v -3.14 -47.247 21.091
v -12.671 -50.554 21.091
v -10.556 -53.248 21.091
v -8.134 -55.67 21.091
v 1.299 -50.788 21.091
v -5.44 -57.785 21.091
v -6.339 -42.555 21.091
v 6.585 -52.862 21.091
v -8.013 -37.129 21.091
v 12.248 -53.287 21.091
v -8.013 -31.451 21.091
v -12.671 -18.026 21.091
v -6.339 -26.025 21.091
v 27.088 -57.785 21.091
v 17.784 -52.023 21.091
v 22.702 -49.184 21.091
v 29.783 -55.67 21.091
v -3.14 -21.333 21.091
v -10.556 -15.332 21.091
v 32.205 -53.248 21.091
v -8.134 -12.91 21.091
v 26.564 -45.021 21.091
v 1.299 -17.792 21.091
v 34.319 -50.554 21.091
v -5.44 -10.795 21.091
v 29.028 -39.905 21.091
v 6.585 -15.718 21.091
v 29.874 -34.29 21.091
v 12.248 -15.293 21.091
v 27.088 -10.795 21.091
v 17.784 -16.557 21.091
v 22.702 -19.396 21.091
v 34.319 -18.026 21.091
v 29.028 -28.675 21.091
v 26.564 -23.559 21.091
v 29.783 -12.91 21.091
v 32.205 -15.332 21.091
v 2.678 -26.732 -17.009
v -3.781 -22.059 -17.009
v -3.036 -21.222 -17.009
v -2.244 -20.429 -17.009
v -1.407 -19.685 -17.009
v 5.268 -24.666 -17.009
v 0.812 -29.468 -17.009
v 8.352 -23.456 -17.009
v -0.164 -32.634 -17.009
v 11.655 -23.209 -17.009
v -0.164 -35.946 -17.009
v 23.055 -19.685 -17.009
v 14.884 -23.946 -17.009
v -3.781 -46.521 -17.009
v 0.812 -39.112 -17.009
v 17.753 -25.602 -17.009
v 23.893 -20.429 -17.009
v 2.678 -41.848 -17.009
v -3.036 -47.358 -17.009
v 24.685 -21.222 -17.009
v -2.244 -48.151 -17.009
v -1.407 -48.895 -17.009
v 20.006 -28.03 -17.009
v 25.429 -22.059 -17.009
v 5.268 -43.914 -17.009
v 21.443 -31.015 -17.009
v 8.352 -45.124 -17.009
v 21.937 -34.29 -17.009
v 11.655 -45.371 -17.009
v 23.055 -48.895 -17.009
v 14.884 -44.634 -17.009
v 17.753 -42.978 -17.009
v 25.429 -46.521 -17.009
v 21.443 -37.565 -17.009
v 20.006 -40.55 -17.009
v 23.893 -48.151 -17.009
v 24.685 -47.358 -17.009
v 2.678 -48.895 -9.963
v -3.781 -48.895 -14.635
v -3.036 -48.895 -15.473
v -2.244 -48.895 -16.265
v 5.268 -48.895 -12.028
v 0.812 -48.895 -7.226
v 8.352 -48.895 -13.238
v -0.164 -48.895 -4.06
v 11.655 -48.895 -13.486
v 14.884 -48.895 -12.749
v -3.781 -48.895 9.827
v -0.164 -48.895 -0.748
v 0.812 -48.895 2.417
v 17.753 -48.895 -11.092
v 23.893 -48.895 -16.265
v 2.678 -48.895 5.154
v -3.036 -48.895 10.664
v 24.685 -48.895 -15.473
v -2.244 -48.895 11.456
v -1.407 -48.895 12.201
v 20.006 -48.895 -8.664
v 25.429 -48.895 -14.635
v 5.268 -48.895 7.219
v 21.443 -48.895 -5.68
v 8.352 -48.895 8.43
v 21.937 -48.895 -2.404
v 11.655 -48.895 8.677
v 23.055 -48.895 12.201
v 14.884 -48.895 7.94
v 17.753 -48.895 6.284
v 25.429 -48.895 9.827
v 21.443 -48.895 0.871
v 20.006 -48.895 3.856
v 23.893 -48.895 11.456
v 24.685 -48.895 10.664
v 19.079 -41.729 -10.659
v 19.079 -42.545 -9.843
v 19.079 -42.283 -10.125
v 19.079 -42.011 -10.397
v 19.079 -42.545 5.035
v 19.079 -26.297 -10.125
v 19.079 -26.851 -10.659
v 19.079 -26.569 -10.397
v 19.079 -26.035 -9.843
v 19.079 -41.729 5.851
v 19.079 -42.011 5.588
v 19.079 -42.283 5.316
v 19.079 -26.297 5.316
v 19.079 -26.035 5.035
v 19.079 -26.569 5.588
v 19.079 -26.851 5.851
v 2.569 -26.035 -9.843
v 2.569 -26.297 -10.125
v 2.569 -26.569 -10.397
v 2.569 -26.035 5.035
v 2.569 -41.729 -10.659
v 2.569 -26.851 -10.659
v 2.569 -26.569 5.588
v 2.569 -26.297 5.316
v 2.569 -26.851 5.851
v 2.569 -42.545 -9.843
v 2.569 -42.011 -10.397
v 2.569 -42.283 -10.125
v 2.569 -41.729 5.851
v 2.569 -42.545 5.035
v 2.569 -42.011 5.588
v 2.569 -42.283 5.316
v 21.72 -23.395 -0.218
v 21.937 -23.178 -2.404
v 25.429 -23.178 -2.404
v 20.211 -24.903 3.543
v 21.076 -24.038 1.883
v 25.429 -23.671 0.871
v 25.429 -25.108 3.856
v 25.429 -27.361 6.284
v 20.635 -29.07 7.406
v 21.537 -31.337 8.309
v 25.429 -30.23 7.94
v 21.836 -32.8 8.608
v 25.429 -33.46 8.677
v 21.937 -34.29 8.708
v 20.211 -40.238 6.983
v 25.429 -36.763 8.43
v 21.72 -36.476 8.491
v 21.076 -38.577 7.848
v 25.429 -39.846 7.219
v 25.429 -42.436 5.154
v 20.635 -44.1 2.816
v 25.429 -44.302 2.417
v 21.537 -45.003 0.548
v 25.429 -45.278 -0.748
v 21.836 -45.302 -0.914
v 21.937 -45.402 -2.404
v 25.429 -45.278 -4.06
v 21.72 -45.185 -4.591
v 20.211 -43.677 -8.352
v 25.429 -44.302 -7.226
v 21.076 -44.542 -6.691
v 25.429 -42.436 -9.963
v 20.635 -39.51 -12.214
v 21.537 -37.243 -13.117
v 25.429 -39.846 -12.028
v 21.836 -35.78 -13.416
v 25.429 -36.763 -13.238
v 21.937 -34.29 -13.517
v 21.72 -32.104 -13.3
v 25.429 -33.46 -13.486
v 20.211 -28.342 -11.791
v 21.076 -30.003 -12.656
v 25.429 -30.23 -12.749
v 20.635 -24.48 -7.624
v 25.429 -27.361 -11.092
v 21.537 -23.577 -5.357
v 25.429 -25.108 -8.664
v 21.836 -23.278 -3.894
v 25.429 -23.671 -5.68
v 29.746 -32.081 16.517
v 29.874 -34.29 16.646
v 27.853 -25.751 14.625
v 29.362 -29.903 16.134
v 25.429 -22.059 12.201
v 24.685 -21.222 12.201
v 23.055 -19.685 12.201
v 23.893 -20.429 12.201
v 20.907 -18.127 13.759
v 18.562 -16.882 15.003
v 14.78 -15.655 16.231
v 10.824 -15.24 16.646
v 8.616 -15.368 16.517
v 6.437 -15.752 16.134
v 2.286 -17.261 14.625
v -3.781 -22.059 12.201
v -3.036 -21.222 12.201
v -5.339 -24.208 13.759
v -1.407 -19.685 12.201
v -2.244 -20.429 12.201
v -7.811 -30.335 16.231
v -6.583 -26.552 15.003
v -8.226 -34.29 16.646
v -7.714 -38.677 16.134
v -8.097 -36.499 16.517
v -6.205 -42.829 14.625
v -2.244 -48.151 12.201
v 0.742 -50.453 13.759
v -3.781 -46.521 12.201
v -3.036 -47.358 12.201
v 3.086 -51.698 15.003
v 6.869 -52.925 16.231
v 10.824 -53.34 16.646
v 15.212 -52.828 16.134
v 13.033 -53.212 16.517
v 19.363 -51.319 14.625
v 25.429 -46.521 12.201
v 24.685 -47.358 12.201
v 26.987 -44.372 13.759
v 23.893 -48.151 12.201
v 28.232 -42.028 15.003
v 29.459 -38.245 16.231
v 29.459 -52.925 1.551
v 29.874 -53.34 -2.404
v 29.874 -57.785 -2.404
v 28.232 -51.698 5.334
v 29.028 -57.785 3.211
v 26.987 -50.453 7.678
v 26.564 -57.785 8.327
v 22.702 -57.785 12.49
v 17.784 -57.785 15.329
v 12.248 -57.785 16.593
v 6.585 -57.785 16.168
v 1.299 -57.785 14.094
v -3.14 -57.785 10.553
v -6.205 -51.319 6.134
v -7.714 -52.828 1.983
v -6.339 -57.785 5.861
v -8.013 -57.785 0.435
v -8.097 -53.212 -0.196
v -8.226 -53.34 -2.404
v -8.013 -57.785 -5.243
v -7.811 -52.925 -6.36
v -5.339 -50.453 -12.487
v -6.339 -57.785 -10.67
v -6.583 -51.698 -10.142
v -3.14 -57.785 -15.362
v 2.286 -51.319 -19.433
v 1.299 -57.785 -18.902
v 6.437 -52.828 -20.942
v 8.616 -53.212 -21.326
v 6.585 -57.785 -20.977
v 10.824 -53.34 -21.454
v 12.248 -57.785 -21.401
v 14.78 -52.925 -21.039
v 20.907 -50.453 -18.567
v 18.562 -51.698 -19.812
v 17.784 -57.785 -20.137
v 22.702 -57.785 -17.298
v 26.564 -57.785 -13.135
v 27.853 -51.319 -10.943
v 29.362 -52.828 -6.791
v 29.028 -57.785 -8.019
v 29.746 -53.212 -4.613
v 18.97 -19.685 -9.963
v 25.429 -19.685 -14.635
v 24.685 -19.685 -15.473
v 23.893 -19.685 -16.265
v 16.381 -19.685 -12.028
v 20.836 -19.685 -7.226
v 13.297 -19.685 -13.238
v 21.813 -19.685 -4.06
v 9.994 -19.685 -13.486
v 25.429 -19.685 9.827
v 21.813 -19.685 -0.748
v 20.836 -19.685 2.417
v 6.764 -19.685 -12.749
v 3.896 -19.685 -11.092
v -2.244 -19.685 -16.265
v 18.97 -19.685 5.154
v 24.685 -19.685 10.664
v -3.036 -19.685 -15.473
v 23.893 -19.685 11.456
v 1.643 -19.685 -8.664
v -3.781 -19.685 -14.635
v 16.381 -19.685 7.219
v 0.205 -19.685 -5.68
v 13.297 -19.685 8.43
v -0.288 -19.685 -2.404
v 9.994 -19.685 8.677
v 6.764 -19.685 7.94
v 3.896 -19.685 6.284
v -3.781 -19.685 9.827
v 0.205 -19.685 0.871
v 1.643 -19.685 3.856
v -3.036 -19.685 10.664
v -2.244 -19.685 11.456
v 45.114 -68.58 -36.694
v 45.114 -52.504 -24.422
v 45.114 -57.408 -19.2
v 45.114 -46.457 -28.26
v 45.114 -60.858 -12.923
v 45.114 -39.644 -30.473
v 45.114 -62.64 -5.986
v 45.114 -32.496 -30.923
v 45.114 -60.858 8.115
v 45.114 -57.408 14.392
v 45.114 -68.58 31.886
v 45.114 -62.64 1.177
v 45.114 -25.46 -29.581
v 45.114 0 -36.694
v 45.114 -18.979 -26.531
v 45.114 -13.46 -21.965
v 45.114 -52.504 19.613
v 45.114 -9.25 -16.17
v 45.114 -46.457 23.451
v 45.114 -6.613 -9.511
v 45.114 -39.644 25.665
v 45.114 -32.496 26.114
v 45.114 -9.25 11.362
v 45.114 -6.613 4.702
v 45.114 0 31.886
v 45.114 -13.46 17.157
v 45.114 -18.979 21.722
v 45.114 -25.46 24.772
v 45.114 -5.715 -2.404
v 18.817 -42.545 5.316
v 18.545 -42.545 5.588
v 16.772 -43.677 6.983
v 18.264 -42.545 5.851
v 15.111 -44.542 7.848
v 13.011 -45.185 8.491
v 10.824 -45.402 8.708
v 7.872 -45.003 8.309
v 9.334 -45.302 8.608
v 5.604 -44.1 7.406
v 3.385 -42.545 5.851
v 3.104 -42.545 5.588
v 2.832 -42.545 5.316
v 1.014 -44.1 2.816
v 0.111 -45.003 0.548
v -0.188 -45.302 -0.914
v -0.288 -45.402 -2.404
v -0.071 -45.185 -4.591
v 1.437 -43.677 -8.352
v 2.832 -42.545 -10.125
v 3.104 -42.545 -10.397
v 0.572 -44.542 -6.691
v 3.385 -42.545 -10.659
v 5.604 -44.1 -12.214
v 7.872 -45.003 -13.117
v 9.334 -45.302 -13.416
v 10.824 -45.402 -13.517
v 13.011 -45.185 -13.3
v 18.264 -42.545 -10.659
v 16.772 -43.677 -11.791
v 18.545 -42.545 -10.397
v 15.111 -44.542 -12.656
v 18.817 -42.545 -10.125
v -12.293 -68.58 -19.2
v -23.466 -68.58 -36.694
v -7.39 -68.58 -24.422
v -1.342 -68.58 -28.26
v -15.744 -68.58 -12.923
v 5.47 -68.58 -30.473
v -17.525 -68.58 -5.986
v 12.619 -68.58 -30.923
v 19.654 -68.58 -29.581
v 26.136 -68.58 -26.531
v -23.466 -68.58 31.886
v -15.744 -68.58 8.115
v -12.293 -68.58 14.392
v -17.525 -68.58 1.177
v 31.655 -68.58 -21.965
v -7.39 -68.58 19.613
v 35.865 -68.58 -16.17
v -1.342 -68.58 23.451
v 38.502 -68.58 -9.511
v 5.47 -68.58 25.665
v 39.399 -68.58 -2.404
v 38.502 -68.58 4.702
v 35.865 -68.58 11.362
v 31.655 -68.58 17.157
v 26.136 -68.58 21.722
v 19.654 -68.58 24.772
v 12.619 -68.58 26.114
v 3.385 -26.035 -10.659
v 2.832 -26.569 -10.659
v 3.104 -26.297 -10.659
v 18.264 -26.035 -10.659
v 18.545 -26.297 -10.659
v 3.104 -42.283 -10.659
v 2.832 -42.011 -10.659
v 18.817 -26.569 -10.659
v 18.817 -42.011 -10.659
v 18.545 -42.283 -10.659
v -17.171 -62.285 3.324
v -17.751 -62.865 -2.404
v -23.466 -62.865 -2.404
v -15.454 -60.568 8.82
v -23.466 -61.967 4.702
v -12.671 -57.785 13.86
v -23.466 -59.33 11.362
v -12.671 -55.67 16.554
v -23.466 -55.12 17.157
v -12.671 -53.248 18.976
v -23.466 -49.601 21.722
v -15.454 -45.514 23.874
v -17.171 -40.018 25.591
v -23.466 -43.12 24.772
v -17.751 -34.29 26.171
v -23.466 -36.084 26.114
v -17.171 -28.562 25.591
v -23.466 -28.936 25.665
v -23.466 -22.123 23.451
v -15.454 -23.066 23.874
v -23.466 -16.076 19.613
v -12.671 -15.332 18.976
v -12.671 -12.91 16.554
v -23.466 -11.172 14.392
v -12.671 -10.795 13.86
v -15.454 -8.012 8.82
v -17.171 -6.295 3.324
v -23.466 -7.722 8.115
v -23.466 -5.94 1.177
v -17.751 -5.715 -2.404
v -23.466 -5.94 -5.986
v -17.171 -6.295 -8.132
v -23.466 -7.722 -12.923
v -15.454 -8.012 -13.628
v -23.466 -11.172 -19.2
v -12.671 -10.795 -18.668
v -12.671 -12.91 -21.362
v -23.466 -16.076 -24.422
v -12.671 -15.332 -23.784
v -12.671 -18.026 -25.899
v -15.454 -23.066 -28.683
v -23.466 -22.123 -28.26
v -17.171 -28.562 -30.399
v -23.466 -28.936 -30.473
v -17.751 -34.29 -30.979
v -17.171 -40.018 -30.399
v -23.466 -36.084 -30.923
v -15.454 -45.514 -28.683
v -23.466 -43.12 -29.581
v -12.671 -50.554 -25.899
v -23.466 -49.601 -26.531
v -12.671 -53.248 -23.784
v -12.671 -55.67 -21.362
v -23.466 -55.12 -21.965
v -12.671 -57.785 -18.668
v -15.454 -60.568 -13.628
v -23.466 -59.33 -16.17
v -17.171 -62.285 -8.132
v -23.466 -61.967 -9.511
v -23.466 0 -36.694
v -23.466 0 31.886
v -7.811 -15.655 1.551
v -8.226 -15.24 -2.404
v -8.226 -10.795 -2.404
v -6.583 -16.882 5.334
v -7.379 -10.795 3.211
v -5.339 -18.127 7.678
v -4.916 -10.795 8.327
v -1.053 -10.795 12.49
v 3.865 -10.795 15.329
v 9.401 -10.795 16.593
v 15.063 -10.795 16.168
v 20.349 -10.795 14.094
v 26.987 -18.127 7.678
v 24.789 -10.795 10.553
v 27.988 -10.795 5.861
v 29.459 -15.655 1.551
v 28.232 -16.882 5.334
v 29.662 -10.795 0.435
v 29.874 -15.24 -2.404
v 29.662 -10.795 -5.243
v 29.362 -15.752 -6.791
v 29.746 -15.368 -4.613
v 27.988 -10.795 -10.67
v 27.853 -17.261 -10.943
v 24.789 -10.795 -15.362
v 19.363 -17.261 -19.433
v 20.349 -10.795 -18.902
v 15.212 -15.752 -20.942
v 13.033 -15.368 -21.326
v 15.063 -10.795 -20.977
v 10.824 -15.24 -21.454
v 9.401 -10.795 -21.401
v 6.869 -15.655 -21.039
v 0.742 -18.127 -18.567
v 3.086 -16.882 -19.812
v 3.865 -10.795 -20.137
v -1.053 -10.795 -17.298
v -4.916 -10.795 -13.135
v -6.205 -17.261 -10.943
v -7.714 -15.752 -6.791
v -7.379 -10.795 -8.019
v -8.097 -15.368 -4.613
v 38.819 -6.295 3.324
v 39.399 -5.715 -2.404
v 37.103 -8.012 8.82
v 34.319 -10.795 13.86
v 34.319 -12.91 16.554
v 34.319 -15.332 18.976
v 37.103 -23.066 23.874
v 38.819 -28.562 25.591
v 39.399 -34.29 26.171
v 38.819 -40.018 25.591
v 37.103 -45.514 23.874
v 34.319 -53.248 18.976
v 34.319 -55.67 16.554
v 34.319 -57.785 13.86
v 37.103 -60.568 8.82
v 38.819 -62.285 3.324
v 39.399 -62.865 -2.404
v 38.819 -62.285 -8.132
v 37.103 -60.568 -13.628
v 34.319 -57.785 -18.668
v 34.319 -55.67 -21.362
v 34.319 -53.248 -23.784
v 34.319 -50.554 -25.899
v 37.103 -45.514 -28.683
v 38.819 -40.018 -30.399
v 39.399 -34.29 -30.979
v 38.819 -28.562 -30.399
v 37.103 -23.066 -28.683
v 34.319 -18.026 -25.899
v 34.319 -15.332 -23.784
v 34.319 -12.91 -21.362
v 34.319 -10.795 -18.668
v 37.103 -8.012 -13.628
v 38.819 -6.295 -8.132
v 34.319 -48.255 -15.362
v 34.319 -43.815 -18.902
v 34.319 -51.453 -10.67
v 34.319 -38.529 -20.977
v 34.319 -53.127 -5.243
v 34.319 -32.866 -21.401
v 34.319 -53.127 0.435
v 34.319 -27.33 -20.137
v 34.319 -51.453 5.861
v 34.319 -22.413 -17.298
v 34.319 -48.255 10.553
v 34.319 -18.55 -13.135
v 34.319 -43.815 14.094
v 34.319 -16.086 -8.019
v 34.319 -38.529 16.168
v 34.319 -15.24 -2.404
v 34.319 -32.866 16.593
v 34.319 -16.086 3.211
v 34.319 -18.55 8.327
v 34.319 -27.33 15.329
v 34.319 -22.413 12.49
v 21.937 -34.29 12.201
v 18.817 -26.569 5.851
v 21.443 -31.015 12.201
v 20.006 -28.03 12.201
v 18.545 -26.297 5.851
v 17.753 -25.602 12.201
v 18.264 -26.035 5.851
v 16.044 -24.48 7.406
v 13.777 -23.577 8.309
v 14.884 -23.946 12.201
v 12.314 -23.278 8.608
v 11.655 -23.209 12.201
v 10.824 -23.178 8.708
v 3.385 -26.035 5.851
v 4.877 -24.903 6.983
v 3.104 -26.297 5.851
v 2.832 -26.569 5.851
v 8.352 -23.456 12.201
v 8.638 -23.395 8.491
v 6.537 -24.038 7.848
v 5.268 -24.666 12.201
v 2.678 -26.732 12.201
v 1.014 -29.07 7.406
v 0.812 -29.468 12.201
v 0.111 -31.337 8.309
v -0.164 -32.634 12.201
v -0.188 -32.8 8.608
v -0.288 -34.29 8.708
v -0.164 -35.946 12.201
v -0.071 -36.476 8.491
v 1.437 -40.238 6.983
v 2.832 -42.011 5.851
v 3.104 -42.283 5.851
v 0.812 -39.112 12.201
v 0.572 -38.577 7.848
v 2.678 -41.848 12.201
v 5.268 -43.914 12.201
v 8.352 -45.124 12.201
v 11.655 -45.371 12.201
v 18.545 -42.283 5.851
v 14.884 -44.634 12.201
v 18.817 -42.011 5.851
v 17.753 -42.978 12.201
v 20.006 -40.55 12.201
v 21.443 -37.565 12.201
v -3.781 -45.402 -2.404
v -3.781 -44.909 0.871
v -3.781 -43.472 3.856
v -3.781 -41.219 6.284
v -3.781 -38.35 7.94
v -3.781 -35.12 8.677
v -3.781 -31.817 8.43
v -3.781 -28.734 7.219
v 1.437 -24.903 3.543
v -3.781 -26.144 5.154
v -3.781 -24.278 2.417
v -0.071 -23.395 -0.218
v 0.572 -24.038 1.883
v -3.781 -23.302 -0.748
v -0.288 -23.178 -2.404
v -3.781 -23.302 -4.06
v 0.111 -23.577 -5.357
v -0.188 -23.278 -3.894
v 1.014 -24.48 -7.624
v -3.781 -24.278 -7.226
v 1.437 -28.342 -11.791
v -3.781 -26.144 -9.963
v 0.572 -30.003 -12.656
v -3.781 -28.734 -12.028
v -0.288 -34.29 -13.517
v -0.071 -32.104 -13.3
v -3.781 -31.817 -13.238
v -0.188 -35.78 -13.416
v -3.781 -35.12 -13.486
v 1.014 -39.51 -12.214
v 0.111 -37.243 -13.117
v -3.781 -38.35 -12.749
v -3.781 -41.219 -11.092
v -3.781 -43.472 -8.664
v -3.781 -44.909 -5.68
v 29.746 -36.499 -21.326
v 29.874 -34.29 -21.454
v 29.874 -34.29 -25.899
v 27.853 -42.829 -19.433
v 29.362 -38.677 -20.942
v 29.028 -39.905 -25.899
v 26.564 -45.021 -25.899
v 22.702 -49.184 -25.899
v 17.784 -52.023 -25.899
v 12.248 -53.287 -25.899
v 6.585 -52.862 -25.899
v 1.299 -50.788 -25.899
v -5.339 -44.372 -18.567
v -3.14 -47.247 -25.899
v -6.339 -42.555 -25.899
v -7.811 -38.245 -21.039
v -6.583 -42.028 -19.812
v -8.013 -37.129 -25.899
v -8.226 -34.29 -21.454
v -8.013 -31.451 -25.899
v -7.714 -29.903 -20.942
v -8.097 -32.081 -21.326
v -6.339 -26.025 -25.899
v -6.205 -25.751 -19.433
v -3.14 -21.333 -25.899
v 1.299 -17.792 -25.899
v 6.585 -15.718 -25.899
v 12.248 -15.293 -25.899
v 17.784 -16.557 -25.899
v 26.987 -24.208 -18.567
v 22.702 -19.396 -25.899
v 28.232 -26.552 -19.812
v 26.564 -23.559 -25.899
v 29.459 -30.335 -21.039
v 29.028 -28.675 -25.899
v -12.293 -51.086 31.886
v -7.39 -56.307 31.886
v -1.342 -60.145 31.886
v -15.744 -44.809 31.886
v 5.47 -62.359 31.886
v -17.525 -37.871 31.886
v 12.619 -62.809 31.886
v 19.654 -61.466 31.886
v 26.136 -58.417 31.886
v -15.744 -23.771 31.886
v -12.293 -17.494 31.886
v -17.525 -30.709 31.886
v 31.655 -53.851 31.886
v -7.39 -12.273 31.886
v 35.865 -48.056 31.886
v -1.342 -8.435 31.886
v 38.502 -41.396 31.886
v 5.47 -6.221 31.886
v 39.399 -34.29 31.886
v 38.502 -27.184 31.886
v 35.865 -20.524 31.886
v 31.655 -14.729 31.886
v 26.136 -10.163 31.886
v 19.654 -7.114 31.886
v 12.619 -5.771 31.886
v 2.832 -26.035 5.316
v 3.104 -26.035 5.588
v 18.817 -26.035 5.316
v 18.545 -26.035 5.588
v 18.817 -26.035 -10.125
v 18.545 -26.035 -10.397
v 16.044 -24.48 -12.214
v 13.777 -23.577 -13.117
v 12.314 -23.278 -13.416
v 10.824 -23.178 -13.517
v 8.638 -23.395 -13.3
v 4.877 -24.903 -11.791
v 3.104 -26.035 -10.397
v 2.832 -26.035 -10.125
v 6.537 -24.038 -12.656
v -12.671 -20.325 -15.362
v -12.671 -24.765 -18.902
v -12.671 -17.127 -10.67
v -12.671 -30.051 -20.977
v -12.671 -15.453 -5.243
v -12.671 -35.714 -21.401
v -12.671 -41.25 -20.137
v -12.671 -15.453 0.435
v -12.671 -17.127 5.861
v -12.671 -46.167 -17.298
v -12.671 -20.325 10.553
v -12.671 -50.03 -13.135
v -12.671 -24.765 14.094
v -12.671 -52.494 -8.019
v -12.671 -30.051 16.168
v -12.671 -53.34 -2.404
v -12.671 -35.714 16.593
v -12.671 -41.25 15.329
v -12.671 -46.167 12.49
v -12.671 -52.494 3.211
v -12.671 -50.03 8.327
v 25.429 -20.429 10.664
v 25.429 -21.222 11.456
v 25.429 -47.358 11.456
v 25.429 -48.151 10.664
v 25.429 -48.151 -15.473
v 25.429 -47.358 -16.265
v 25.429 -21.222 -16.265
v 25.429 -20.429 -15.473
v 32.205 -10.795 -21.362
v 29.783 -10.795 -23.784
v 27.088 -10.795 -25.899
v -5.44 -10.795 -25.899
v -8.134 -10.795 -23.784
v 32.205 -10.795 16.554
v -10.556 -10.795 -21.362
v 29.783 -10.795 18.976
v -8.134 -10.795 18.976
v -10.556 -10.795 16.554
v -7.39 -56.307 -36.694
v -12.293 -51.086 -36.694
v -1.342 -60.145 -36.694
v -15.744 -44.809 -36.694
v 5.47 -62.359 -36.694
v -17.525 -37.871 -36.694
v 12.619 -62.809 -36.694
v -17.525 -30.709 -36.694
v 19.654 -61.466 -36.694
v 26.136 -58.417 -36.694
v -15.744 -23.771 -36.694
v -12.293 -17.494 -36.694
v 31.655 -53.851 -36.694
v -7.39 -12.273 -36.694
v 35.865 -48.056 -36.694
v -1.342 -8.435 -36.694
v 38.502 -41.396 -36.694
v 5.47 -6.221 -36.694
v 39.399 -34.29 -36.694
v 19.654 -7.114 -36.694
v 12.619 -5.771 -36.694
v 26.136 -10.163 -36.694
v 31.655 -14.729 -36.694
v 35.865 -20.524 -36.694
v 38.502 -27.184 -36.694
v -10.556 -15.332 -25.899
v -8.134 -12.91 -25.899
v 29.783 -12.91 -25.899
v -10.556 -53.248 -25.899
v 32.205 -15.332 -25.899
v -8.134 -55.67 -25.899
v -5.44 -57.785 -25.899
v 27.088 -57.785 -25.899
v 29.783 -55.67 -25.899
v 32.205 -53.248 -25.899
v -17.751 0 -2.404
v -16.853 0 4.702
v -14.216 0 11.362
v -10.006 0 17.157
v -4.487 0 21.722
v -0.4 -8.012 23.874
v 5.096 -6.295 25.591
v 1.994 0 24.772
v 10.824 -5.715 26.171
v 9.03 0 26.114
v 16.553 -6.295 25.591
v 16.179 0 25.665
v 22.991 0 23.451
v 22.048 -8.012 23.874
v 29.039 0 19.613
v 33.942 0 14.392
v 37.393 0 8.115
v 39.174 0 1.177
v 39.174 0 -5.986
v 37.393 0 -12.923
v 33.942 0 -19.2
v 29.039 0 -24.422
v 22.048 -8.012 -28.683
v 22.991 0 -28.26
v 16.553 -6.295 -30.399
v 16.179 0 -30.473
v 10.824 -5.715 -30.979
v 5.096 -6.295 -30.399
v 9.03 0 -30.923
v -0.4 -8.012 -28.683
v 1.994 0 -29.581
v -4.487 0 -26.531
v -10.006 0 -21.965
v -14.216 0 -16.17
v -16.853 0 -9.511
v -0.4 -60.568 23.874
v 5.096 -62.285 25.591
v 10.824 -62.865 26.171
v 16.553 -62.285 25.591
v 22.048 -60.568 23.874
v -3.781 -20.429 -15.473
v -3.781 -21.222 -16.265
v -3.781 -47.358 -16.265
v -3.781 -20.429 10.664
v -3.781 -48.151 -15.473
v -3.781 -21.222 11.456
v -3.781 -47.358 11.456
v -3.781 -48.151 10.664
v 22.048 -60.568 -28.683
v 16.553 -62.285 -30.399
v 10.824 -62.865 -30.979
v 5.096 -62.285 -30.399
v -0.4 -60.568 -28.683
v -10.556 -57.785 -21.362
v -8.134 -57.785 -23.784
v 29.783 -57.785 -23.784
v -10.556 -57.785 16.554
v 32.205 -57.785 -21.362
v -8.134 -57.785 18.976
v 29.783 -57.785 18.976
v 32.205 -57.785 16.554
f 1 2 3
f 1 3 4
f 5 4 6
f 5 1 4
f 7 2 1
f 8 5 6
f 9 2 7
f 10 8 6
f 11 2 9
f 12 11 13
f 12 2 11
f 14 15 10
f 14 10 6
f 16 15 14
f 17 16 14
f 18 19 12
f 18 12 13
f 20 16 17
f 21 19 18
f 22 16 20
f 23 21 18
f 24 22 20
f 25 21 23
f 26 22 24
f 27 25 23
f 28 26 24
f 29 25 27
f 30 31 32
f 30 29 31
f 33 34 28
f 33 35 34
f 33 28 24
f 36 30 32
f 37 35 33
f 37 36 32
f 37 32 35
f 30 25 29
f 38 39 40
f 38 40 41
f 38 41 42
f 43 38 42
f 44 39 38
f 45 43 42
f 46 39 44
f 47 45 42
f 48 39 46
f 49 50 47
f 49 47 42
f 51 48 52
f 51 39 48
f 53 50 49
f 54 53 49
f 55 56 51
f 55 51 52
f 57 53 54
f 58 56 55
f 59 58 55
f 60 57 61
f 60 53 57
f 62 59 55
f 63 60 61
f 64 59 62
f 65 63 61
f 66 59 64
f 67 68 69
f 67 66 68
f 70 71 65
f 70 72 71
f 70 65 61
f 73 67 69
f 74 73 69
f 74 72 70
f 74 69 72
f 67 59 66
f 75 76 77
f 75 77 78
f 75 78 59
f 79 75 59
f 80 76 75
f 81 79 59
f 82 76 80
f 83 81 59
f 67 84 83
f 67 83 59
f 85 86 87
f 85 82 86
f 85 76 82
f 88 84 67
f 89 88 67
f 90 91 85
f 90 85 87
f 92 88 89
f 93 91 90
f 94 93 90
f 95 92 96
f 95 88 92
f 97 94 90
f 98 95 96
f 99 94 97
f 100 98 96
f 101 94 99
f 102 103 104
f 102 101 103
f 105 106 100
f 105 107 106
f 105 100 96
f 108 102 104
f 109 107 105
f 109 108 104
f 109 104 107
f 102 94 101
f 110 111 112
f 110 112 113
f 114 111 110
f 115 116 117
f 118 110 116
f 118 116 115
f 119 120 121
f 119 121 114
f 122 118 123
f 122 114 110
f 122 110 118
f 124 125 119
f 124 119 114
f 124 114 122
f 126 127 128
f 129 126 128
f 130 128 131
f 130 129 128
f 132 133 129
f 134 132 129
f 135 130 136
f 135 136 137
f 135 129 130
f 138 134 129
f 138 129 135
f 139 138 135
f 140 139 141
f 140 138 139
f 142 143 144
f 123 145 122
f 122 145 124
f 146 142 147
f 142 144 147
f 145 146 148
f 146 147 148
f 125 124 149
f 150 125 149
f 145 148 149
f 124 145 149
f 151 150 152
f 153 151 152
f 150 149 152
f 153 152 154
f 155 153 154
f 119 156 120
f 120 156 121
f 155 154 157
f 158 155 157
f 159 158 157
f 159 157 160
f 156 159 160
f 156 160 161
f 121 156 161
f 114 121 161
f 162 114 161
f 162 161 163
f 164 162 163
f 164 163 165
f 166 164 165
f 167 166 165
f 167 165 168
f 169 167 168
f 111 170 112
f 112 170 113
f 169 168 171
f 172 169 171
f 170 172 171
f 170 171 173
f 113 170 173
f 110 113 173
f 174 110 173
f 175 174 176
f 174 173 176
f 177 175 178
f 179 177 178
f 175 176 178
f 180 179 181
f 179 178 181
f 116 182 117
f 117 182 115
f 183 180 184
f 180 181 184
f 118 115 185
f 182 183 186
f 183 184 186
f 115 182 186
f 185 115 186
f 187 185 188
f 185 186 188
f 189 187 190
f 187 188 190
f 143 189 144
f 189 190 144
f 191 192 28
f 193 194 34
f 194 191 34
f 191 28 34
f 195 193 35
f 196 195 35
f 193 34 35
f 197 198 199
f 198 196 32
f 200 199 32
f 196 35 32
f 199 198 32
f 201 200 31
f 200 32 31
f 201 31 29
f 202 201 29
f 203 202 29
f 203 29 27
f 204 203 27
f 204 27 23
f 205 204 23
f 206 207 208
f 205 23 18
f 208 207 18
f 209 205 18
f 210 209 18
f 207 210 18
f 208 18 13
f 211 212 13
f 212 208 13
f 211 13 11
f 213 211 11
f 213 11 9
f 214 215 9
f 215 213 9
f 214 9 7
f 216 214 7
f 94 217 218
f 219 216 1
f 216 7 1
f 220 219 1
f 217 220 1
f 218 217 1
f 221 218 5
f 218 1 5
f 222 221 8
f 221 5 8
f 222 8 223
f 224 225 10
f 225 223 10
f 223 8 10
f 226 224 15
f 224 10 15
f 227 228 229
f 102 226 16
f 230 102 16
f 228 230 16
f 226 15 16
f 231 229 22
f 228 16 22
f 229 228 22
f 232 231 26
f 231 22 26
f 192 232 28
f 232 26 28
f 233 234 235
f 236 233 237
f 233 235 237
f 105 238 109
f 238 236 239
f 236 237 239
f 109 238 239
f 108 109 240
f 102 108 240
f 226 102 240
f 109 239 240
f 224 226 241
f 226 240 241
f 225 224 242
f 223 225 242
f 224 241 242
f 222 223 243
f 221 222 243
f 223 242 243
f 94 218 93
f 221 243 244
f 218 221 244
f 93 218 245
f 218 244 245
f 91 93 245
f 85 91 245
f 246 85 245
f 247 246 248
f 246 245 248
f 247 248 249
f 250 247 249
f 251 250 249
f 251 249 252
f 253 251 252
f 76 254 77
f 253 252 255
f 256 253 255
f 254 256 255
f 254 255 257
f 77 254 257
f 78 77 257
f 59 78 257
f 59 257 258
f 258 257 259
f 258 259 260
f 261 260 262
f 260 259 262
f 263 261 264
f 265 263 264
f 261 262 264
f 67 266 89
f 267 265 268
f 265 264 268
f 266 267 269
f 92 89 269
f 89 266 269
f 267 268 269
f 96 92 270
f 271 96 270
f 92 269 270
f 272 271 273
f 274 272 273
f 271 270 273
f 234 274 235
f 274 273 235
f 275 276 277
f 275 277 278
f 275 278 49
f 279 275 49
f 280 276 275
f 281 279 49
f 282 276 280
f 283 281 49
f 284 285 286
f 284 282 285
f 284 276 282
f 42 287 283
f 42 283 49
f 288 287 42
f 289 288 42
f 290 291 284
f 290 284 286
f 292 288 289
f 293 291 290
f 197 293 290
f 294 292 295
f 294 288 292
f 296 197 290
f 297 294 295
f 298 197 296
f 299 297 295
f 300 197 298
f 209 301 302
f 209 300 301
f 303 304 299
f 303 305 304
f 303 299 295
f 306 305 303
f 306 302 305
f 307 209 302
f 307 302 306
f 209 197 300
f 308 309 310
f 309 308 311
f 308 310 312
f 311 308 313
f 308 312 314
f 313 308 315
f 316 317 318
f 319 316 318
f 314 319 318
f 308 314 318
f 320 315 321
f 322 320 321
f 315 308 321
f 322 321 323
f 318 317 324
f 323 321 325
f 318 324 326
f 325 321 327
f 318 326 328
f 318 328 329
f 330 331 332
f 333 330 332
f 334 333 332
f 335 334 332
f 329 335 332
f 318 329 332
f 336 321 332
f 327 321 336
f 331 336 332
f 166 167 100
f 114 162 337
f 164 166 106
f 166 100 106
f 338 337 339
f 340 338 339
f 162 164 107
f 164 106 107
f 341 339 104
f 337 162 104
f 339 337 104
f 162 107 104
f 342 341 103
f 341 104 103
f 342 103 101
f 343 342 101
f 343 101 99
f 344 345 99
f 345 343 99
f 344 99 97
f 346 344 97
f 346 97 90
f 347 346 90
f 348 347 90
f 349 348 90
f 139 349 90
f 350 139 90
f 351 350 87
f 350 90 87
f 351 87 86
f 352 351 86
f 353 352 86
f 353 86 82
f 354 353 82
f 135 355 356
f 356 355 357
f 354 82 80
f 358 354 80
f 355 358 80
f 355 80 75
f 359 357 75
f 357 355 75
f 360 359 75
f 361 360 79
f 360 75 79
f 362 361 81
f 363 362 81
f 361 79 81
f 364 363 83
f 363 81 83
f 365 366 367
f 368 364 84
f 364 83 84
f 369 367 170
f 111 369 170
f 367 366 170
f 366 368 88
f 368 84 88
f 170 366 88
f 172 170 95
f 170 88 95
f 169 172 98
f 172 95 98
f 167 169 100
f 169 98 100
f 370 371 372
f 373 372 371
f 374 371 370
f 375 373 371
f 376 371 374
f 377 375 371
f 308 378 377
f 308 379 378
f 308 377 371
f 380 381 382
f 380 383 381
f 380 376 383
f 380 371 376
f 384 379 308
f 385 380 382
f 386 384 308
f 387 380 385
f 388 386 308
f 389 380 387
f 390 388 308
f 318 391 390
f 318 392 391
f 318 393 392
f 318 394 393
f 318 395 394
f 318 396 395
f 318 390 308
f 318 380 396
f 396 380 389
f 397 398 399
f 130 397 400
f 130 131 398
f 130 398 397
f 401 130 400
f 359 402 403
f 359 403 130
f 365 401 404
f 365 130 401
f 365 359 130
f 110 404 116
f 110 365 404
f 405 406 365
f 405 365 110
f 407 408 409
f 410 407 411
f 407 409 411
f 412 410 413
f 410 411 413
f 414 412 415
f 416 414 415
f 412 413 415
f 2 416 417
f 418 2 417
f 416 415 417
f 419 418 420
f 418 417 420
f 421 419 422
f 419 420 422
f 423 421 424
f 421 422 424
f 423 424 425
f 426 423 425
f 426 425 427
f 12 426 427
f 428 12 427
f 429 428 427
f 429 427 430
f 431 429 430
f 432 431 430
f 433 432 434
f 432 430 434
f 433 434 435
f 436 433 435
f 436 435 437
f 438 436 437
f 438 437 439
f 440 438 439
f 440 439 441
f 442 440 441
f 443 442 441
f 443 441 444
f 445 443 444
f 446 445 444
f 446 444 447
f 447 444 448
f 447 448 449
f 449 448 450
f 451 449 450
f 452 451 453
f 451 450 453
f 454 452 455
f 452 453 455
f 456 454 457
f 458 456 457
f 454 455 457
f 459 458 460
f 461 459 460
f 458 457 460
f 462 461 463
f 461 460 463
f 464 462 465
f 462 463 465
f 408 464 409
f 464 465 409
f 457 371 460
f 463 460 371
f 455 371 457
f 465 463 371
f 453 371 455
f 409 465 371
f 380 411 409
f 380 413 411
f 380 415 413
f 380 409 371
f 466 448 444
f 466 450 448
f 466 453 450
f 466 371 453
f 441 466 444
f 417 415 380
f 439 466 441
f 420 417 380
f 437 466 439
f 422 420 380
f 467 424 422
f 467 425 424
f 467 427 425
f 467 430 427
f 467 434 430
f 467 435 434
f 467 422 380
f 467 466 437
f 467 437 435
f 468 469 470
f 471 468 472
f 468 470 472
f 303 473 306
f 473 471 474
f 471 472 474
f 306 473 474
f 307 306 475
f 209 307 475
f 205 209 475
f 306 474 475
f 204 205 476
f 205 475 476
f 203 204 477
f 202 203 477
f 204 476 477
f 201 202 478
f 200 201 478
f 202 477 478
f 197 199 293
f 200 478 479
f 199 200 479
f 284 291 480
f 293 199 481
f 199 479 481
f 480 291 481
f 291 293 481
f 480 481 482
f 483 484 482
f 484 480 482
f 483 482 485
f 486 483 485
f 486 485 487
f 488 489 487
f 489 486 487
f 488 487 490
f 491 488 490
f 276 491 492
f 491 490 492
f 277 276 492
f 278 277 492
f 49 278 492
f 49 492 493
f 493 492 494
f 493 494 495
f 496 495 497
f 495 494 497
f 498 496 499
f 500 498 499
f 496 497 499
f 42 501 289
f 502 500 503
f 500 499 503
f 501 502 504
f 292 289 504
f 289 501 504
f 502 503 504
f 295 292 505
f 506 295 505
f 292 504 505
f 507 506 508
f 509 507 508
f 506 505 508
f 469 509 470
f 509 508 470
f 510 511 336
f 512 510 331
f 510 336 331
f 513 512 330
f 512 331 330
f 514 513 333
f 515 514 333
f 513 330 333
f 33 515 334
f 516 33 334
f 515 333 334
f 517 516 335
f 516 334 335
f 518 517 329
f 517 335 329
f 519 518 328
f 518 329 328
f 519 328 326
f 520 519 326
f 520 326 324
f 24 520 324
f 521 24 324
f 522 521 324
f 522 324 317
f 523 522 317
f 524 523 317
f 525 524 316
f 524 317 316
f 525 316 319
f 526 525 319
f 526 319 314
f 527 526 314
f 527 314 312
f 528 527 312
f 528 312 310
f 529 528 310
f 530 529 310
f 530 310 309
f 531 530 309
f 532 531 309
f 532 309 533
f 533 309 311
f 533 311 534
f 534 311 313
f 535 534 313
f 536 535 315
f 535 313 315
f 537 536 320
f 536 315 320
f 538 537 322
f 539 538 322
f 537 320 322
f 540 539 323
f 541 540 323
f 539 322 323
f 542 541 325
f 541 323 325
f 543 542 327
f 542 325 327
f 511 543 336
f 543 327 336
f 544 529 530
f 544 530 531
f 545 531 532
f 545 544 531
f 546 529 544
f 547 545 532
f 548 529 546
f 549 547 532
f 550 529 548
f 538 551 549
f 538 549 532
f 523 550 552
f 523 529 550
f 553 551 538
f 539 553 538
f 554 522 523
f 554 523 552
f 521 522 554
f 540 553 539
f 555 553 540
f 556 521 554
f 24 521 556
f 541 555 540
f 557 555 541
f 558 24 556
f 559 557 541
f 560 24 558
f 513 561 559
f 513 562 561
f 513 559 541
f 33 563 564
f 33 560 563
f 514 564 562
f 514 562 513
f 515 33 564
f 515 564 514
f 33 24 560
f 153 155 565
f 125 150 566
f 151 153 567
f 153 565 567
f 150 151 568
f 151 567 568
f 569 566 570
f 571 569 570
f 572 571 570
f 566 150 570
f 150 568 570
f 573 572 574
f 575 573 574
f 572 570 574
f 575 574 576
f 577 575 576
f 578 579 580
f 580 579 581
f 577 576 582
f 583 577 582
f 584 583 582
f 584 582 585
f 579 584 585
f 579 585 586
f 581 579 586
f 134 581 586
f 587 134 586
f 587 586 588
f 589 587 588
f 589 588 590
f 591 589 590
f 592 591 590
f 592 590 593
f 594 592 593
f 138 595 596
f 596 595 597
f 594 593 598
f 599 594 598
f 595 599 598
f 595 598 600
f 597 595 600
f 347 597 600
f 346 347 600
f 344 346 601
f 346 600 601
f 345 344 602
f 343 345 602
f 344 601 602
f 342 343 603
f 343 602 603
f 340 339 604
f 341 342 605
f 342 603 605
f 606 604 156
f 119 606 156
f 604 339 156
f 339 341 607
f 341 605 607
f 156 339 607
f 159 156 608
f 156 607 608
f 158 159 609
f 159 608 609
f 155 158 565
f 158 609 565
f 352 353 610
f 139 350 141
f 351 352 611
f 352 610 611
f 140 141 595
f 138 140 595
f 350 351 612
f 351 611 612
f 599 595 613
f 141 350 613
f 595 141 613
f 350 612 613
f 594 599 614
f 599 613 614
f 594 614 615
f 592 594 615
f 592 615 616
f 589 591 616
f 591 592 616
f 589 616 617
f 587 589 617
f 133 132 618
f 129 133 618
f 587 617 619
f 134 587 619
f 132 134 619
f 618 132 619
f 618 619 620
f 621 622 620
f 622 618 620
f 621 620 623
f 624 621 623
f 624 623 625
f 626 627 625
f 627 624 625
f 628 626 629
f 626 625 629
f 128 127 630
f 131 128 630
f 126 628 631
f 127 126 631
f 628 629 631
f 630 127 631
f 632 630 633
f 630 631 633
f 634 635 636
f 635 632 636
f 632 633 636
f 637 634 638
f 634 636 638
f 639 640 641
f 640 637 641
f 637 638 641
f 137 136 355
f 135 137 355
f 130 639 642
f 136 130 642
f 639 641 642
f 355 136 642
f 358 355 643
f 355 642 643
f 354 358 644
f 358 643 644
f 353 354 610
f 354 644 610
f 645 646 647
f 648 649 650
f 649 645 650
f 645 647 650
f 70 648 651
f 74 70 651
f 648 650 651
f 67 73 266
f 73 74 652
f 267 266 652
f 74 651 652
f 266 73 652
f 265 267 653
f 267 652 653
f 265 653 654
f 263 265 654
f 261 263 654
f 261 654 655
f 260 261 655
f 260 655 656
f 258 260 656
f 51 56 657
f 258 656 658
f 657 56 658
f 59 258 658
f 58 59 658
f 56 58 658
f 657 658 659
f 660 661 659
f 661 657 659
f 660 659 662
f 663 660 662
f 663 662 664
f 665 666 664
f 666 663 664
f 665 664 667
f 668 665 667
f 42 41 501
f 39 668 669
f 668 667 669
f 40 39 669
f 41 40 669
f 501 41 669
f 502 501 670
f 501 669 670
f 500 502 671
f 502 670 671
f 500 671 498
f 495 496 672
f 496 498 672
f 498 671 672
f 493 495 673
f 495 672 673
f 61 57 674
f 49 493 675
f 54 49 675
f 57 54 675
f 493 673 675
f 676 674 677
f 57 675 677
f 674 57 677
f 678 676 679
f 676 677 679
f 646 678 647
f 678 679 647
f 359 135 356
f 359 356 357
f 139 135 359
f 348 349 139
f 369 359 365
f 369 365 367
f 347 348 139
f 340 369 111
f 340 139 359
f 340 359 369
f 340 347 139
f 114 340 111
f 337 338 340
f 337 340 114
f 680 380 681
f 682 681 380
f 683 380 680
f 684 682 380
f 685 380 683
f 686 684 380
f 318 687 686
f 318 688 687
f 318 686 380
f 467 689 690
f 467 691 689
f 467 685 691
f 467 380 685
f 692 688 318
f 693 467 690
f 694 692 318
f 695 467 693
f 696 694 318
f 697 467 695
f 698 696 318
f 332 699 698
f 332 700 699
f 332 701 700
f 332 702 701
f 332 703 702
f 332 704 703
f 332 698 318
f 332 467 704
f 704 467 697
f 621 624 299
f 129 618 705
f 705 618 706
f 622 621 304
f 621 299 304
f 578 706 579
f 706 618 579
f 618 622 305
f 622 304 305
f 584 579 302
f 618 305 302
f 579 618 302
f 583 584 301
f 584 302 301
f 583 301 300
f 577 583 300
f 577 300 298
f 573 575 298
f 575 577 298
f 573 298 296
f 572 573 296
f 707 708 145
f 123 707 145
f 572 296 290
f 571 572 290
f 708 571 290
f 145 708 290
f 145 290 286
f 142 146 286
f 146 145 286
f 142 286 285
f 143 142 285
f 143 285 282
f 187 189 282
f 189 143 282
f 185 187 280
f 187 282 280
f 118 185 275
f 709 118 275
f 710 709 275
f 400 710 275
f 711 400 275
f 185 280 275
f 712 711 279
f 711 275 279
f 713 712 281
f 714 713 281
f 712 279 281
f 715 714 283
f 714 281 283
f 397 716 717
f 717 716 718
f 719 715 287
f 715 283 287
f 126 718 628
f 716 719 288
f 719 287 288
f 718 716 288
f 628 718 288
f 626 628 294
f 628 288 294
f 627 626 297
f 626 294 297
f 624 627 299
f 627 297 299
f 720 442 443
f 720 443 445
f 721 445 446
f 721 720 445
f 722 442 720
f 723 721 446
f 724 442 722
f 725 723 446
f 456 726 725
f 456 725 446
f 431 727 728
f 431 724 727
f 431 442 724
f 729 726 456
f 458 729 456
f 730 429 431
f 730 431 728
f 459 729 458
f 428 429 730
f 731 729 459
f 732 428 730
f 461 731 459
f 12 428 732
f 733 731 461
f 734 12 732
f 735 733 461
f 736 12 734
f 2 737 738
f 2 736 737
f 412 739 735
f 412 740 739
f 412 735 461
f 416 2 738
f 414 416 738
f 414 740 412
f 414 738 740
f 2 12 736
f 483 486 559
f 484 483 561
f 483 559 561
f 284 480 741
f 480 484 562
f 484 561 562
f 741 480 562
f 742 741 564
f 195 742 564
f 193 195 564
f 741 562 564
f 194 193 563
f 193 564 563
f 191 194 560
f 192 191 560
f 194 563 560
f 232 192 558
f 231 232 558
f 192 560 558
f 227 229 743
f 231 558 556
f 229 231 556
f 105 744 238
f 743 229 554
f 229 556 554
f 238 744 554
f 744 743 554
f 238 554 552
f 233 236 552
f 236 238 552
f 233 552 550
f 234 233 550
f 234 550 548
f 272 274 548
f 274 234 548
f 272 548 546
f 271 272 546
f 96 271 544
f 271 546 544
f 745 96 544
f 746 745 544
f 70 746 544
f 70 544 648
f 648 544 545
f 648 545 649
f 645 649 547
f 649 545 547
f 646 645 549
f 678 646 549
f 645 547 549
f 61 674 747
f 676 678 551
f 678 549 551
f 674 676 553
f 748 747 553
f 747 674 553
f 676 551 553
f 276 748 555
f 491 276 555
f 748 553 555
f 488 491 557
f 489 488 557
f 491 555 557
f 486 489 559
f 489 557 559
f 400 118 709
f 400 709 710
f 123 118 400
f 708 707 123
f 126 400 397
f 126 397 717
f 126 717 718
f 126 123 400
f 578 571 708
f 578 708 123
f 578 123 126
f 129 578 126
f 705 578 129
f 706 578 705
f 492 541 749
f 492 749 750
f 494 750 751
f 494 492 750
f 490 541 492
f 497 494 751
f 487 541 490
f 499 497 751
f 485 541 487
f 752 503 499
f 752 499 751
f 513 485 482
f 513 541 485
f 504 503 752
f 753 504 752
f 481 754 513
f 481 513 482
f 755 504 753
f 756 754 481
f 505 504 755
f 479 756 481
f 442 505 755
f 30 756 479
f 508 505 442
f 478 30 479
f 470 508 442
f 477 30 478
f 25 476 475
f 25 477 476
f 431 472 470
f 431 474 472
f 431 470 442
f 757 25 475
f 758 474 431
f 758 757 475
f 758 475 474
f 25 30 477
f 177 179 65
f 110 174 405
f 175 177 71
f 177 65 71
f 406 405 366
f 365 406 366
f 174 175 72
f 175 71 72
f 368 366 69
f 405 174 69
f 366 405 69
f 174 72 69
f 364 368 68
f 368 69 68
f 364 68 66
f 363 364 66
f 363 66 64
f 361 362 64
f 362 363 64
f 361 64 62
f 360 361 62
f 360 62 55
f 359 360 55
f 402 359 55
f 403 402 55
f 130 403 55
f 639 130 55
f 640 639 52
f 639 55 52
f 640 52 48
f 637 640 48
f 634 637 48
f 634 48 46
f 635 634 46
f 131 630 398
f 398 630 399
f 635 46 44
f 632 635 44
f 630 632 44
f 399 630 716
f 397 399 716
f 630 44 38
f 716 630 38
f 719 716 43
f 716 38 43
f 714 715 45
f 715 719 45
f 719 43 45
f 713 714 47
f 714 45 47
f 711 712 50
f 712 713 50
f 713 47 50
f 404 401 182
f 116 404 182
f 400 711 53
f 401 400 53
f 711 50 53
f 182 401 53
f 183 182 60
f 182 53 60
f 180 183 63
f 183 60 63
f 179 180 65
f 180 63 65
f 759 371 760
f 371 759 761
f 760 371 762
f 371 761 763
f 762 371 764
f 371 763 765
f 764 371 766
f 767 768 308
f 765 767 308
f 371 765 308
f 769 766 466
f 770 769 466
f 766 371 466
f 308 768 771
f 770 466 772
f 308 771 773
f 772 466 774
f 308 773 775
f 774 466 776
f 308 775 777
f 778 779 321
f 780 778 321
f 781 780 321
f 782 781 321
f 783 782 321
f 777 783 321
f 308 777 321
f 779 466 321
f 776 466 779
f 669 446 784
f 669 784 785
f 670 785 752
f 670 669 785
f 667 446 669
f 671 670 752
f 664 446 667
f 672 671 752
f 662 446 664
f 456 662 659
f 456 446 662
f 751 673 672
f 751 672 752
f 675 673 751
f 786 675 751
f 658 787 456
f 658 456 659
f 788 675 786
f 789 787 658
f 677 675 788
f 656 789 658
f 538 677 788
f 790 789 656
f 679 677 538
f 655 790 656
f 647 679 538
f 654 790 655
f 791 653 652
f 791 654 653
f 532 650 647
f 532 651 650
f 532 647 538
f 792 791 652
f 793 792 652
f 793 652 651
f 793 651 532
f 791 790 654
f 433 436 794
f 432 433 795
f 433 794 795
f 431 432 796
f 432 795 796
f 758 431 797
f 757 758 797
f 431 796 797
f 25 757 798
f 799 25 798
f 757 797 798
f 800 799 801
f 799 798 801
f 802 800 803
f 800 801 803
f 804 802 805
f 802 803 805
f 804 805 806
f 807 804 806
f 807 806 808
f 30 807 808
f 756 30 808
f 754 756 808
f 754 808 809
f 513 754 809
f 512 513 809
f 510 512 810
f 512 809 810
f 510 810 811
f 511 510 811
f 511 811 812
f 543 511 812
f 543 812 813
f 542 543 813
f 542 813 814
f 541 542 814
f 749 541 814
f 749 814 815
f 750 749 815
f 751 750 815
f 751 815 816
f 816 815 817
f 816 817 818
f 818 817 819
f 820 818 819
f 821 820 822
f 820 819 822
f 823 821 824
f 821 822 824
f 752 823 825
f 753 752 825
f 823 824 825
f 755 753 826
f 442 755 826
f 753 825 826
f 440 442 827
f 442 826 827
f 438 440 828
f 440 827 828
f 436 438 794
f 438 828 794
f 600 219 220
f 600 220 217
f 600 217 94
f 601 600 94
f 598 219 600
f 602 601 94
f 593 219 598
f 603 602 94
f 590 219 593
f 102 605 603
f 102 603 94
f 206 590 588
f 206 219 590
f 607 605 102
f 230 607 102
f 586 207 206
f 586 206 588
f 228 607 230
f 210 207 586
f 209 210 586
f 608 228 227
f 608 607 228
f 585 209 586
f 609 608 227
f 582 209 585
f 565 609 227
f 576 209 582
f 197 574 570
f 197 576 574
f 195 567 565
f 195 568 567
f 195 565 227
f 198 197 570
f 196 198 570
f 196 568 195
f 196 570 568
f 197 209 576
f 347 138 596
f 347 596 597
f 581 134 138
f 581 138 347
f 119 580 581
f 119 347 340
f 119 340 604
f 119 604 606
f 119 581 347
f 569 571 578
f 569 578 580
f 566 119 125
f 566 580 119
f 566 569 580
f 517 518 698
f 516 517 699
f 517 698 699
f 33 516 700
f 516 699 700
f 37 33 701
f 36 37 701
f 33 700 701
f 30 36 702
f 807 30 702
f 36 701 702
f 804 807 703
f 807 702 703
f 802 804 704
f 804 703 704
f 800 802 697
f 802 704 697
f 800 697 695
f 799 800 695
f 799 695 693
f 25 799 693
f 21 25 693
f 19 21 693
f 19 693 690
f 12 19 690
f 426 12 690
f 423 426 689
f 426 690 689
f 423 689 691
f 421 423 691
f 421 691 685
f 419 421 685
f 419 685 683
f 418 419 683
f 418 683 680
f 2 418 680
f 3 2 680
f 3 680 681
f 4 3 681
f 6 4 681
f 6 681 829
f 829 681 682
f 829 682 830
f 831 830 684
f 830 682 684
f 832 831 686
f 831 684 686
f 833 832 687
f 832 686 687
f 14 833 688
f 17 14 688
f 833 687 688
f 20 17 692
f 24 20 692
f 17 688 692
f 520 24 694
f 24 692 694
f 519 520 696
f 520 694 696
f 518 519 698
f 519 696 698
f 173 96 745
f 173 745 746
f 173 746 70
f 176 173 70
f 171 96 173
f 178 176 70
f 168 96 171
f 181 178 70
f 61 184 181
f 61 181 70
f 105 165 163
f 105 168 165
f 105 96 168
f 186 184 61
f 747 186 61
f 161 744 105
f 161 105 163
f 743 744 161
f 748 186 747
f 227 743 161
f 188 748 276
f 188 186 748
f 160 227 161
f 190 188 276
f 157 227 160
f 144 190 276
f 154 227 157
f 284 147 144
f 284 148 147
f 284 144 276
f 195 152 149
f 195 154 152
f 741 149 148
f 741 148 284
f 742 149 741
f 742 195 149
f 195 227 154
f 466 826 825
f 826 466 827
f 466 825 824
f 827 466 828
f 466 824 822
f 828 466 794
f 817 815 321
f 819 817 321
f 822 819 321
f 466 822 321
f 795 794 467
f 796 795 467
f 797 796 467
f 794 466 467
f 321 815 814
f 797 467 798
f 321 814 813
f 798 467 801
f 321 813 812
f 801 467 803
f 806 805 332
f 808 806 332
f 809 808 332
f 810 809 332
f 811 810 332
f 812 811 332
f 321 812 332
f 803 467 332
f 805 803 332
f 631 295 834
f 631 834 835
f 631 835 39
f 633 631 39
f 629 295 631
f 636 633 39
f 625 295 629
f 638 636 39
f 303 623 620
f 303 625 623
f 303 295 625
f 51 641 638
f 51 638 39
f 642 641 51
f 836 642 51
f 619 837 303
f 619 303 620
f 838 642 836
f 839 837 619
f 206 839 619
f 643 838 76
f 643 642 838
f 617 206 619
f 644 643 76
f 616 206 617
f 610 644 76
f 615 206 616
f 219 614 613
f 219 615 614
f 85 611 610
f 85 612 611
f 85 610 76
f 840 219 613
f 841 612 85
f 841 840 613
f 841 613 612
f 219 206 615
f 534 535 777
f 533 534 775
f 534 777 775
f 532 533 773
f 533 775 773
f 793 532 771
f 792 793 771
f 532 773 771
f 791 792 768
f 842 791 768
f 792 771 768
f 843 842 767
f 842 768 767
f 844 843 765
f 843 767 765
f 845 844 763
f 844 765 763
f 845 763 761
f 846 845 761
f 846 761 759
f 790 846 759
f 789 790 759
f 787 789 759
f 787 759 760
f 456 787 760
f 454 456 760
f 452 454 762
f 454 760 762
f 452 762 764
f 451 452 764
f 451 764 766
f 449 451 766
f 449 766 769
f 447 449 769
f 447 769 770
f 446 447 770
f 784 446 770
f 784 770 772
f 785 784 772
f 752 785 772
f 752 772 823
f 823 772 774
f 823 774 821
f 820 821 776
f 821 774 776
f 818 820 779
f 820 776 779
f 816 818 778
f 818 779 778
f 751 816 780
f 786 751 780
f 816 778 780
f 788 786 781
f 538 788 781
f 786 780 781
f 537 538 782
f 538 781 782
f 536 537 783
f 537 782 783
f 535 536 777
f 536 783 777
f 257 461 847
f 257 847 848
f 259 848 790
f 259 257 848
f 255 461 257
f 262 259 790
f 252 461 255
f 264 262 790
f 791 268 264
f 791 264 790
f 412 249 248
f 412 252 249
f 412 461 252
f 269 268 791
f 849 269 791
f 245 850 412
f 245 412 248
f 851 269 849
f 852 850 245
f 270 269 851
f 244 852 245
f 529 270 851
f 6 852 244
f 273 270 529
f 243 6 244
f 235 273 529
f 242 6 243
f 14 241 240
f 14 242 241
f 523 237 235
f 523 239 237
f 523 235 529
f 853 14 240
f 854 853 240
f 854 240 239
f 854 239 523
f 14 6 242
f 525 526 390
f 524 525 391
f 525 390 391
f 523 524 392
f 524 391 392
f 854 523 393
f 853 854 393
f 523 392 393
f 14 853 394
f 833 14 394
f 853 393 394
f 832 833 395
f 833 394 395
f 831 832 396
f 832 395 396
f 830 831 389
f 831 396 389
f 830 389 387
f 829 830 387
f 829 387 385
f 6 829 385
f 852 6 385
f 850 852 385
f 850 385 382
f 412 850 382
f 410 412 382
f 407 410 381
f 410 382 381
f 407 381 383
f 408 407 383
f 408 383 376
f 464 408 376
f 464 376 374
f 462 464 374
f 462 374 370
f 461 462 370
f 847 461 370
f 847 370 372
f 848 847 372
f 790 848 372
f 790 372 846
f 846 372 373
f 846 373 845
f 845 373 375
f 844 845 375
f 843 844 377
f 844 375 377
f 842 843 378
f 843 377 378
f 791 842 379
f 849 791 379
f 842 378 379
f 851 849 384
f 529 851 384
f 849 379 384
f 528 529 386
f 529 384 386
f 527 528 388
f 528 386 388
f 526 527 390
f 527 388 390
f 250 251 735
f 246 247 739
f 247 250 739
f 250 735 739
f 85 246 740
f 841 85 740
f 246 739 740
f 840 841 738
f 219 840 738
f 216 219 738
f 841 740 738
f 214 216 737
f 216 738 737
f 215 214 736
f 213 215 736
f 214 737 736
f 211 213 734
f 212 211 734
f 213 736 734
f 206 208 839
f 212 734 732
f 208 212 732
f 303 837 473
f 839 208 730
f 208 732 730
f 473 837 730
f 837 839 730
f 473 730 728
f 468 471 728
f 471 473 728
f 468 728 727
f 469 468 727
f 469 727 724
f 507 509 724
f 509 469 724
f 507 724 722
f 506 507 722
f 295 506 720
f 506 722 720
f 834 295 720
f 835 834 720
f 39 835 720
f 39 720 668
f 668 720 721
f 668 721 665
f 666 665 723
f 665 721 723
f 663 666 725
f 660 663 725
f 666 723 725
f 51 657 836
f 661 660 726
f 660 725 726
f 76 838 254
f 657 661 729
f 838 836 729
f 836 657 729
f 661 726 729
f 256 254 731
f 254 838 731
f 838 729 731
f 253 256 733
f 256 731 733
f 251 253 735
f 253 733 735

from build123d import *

# Parameters (mm, degrees)
F0_W      = 68.58
F0_H      = 68.58
F1_DEPTH  = 68.58
F2_R      = 28.575
F3_DEPTH  = 10.795
F4_R      = 28.575
F5_DEPTH  = 10.795
F6_R      = 28.575
F7_DEPTH  = 10.795
F8_R      = 28.575
F9_DEPTH  = 10.795
F10_R     = 28.575
F11_DEPTH = 10.795
F12_R     = 28.575
F13_DEPTH = 10.795
F14_R     = 19.05
F15_DEPTH = 8.89
F16_R     = 19.05
F17_DEPTH = 8.89
F18_R     = 19.05
F19_DEPTH = 8.89
F20_R     = 19.05
F21_DEPTH = 8.89
F22_R     = 19.05
F23_DEPTH = 8.89
F24_R     = 19.05
F25_DEPTH = 8.89
F26_R     = 11.1125
F27_DEPTH = 6.35
F28_R     = 11.1125
F29_DEPTH = 6.35
F30_R     = 11.1125
F31_DEPTH = 6.35
F32_R     = 11.1125
F33_DEPTH = 6.35
F34_R     = 11.1125
F35_DEPTH = 6.35
F36_R     = 11.1125
F37_DEPTH = 6.35


with BuildPart() as f1:
    # F0 (on Front) → F1 (new body)
    with BuildSketch(Plane.XZ):
        with Locations((10.824279, -2.404214)):
            Rectangle(F0_W, F0_H)
    extrude(amount=F1_DEPTH)

    # F2 (on face) → F3 (cut)
    with BuildSketch(Plane.XZ.offset(68.58)):
        with Locations((10.824279, -2.404214)):
            Circle(F2_R)
    extrude(amount=-F3_DEPTH, mode=Mode.SUBTRACT)

    # F4 (on face) → F5 (cut)
    with BuildSketch(Plane.YZ.offset(45.114279)):
        with Locations((-34.29, -2.404214)):
            Circle(F4_R)
    extrude(amount=-F5_DEPTH, mode=Mode.SUBTRACT)

    # F6 (on face) → F7 (cut)
    with BuildSketch(Plane(origin=(0, 0, 0), x_dir=(-1, 0, 0), z_dir=(0, 1, 0))):
        with Locations((-10.824279, -2.404214)):
            Circle(F6_R)
    extrude(amount=-F7_DEPTH, mode=Mode.SUBTRACT)

    # F8 (on face) → F9 (cut)
    with BuildSketch(Plane(origin=(-23.465721, 0, 0), x_dir=(0, -1, 0), z_dir=(-1, 0, 0))):
        with Locations((34.29, -2.404214)):
            Circle(F8_R)
    extrude(amount=-F9_DEPTH, mode=Mode.SUBTRACT)

    # F10 (on face) → F11 (cut)
    with BuildSketch(Plane.XY.offset(31.885786)):
        with Locations((10.824279, -34.29)):
            Circle(F10_R)
    extrude(amount=-F11_DEPTH, mode=Mode.SUBTRACT)

    # F12 (on face) → F13 (cut)
    with BuildSketch(Plane(origin=(0, 0, -36.694214), x_dir=(1, 0, 0), z_dir=(0, 0, -1))):
        with Locations((10.824279, 34.29)):
            Circle(F12_R)
    extrude(amount=-F13_DEPTH, mode=Mode.SUBTRACT)

    # F14 (on face) → F15 (cut)
    with BuildSketch(Plane.XZ.offset(57.785)):
        with Locations((10.824279, -2.404214)):
            Circle(F14_R)
    extrude(amount=-F15_DEPTH, mode=Mode.SUBTRACT)

    # F16 (on face) → F17 (cut)
    with BuildSketch(Plane.YZ.offset(34.319279)):
        with Locations((-34.29, -2.404214)):
            Circle(F16_R)
    extrude(amount=-F17_DEPTH, mode=Mode.SUBTRACT)

    # F18 (on face) → F19 (cut)
    with BuildSketch(Plane(origin=(0, -10.795, 0), x_dir=(-1, 0, 0), z_dir=(0, 1, 0))):
        with Locations((-10.824279, -2.404214)):
            Circle(F18_R)
    extrude(amount=-F19_DEPTH, mode=Mode.SUBTRACT)

    # F20 (on face) → F21 (cut)
    with BuildSketch(Plane(origin=(-12.670721, 0, 0), x_dir=(0, -1, 0), z_dir=(-1, 0, 0))):
        with Locations((34.29, -2.404214)):
            Circle(F20_R)
    extrude(amount=-F21_DEPTH, mode=Mode.SUBTRACT)

    # F22 (on face) → F23 (cut)
    with BuildSketch(Plane.XY.offset(21.090786)):
        with Locations((10.824279, -34.29)):
            Circle(F22_R)
    extrude(amount=-F23_DEPTH, mode=Mode.SUBTRACT)

    # F24 (on face) → F25 (cut)
    with BuildSketch(Plane(origin=(0, 0, -25.899214), x_dir=(1, 0, 0), z_dir=(0, 0, -1))):
        with Locations((10.824279, 34.29)):
            Circle(F24_R)
    extrude(amount=-F25_DEPTH, mode=Mode.SUBTRACT)

    # F26 (on face) → F27 (cut)
    with BuildSketch(Plane.YZ.offset(25.429279)):
        with Locations((-34.29, -2.404214)):
            Circle(F26_R)
    extrude(amount=-F27_DEPTH, mode=Mode.SUBTRACT)

    # F28 (on face) → F29 (cut)
    with BuildSketch(Plane.XY.offset(12.200786)):
        with Locations((10.824279, -34.29)):
            Circle(F28_R)
    extrude(amount=-F29_DEPTH, mode=Mode.SUBTRACT)

    # F30 (on face) → F31 (cut)
    with BuildSketch(Plane.XZ.offset(48.895)):
        with Locations((10.824279, -2.404214)):
            Circle(F30_R)
    extrude(amount=-F31_DEPTH, mode=Mode.SUBTRACT)

    # F32 (on face) → F33 (cut)
    with BuildSketch(Plane(origin=(0, -19.685, 0), x_dir=(-1, 0, 0), z_dir=(0, 1, 0))):
        with Locations((-10.824279, -2.404214)):
            Circle(F32_R)
    extrude(amount=-F33_DEPTH, mode=Mode.SUBTRACT)

    # F34 (on face) → F35 (cut)
    with BuildSketch(Plane(origin=(0, 0, -17.009214), x_dir=(1, 0, 0), z_dir=(0, 0, -1))):
        with Locations((10.824279, 34.29)):
            Circle(F34_R)
    extrude(amount=-F35_DEPTH, mode=Mode.SUBTRACT)

    # F36 (on face) → F37 (cut)
    with BuildSketch(Plane(origin=(-3.780721, 0, 0), x_dir=(0, -1, 0), z_dir=(-1, 0, 0))):
        with Locations((34.29, -2.404214)):
            Circle(F36_R)
    extrude(amount=-F37_DEPTH, mode=Mode.SUBTRACT)


solid = f1.part
